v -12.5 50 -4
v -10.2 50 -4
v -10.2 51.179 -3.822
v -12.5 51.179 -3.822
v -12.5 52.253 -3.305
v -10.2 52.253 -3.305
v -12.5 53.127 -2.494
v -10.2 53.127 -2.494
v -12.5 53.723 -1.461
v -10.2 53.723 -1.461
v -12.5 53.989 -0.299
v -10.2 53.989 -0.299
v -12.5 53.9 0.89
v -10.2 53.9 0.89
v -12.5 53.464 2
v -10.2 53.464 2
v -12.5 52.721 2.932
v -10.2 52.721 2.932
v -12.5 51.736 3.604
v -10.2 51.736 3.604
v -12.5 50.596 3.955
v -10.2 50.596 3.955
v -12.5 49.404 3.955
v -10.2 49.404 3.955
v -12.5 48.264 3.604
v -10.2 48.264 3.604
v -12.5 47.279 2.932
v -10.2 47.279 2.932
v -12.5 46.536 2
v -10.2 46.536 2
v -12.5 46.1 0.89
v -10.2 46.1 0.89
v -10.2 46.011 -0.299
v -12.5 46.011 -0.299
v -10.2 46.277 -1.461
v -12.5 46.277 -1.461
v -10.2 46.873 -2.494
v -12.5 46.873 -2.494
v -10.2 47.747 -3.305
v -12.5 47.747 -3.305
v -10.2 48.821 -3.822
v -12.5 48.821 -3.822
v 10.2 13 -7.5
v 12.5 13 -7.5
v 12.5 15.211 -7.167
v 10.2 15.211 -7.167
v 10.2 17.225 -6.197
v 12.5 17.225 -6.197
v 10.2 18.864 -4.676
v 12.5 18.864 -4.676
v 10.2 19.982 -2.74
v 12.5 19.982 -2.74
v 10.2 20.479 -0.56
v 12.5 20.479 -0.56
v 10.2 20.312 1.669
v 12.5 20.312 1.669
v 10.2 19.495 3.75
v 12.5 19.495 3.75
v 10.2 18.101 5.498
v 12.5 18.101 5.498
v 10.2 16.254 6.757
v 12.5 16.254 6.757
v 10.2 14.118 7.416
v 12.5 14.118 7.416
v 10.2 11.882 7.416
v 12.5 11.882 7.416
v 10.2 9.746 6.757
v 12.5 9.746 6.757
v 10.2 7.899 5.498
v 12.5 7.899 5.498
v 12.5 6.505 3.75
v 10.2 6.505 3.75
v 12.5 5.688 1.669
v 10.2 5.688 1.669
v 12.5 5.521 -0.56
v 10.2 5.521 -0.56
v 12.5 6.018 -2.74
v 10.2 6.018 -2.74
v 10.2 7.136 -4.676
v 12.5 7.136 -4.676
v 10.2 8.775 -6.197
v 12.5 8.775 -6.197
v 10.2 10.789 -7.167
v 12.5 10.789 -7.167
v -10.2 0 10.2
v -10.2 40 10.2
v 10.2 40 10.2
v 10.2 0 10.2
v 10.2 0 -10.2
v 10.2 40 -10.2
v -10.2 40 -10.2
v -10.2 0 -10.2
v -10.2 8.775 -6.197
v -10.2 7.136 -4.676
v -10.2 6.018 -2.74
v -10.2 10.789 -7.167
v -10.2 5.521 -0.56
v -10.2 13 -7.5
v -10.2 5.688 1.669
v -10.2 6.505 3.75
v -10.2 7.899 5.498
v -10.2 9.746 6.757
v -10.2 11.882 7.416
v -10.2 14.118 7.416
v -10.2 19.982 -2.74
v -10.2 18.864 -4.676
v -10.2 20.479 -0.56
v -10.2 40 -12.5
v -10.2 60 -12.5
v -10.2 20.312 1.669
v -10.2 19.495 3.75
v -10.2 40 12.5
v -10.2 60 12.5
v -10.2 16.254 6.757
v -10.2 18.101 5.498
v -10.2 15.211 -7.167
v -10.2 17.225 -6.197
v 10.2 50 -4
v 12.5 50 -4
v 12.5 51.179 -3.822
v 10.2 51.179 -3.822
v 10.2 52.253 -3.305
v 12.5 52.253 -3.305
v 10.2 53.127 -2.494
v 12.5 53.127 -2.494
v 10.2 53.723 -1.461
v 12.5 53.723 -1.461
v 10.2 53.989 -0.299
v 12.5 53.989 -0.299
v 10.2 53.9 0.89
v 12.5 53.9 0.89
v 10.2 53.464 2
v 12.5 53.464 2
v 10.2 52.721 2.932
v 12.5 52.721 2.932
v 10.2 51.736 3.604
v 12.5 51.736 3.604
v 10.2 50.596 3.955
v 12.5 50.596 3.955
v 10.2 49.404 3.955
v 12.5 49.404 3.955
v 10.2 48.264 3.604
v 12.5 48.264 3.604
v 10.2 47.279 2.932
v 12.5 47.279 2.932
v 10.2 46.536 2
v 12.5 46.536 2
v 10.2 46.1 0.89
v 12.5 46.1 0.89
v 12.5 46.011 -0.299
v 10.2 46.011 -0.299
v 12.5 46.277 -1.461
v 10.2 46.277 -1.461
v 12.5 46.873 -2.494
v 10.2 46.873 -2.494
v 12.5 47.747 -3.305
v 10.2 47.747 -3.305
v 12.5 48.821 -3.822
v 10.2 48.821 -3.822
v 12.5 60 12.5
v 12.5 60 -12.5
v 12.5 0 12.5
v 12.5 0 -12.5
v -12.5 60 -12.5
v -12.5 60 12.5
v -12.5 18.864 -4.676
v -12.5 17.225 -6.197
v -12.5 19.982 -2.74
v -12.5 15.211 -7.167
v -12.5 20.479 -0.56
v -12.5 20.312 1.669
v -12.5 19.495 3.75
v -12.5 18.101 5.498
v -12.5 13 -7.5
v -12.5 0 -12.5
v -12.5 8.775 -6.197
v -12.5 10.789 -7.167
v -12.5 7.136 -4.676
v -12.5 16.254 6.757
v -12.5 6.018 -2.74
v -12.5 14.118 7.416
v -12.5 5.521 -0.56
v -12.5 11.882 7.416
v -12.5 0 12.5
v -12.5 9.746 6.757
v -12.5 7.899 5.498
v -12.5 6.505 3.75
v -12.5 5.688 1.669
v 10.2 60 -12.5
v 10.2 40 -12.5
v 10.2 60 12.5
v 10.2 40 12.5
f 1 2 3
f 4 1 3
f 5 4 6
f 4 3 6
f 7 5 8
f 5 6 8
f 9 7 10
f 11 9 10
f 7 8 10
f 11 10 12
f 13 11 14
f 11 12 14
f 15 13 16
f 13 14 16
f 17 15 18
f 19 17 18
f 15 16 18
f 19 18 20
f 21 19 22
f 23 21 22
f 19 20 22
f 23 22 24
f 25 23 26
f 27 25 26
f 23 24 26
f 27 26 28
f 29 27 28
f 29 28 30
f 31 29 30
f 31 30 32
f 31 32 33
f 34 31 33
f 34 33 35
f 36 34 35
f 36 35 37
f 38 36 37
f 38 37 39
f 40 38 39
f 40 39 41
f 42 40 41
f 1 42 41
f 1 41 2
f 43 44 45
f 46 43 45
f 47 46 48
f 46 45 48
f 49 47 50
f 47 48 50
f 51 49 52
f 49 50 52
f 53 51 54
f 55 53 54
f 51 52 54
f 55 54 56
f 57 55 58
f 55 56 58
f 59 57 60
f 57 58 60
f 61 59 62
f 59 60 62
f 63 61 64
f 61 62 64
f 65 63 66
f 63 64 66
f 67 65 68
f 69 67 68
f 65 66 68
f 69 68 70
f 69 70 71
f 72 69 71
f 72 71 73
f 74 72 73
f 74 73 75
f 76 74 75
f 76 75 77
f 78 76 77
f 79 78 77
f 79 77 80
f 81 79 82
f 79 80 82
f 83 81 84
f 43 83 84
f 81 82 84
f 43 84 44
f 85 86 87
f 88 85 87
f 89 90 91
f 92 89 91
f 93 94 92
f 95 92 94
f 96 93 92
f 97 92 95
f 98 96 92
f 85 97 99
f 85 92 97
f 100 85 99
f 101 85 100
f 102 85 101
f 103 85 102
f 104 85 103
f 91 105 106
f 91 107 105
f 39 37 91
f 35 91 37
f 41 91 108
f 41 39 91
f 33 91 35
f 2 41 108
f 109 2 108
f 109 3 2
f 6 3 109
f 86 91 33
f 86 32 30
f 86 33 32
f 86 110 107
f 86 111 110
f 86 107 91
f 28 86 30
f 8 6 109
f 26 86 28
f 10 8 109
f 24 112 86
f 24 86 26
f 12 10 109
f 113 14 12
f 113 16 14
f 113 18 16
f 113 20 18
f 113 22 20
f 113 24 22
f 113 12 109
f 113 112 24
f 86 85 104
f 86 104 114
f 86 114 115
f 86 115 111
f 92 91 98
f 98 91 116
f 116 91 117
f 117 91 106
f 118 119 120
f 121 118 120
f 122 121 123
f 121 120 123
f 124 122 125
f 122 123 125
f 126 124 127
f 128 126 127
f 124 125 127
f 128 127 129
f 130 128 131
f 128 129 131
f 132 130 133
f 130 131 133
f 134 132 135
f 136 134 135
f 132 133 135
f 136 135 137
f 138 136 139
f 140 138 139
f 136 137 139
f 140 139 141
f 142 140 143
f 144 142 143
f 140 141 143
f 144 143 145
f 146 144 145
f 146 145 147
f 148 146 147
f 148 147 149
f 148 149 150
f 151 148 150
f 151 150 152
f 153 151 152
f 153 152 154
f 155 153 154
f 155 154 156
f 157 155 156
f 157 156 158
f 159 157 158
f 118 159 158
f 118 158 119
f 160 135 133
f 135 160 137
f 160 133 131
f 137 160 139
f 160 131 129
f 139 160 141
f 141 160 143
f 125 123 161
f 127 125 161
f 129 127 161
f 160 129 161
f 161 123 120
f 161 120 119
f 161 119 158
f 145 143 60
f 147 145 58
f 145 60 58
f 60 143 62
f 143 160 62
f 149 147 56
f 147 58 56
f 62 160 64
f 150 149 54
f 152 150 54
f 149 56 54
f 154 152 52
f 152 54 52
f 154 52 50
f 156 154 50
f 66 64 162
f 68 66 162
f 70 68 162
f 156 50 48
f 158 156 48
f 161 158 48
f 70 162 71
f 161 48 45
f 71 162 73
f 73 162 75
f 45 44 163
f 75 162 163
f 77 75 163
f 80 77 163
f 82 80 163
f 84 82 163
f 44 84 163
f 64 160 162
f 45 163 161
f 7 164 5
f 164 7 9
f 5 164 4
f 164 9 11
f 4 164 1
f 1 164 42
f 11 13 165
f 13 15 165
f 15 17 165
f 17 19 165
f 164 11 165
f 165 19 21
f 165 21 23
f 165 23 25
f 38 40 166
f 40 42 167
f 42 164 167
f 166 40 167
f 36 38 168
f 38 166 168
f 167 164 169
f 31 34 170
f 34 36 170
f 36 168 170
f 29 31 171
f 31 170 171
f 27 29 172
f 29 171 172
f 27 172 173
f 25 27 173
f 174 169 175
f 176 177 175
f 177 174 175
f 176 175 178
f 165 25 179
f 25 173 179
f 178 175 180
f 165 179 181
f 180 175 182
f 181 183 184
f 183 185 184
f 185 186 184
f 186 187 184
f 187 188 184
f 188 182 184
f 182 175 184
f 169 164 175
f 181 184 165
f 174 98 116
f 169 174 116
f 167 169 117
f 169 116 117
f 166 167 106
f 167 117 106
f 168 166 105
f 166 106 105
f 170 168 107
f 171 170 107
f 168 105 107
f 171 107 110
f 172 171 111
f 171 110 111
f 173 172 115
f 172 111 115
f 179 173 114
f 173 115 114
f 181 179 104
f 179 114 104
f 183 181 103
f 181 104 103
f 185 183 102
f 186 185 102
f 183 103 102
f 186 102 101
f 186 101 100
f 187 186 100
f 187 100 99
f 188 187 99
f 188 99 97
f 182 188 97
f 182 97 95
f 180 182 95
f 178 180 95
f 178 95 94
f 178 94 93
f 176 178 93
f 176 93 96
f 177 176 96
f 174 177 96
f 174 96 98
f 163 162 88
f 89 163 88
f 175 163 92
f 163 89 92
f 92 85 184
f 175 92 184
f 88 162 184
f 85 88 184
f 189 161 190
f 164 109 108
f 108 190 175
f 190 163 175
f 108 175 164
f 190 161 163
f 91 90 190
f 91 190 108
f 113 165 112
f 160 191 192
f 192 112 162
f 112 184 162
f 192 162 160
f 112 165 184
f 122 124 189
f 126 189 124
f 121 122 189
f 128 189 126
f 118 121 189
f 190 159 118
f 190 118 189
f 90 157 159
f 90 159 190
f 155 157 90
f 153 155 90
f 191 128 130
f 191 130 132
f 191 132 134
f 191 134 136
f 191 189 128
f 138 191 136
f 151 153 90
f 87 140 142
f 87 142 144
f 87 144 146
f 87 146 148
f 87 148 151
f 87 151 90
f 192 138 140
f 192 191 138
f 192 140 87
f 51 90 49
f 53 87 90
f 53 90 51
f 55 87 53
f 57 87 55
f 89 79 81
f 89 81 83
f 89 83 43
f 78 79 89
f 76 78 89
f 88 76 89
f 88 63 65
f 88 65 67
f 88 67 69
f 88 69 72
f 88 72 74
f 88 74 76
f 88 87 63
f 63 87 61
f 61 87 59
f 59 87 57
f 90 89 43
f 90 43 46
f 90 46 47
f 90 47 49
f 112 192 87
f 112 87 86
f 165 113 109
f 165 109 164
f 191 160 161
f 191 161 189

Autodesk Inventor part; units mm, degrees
ref_plane "YZ Plane" through (0, 0, 0) normal (1, 0, 0) x (0, 1, 0)
ref_plane "XZ Plane" through (0, 0, 0) normal (0, 1, 0) x (-1, 0, 0)
ref_plane "XY Plane" through (0, 0, 0) normal (0, 0, 1) x (1, 0, 0)
sketch "スケッチ1" plane through (0, 0, 0) normal (0, 1, 0) x (-1, 0, 0)
  line L0 (12.5, 12.5) -> (-12.5, 12.5)
  line L1 (-12.5, 12.5) -> (-12.5, -12.5)
  line L2 (-12.5, -12.5) -> (12.5, -12.5)
  line L3 (12.5, -12.5) -> (12.5, 12.5)
  line L4 (12.5, 12.5) -> (-12.5, -12.5) construction
  line L5 (-12.5, 12.5) -> (12.5, -12.5) construction
  point P0 (0, 0)
  dimension "d0" = 25
  dimension "d1" = 25
extrude "押し出し1" add sketch "スケッチ1" along normal blind 60
shell "シェル1" thickness 2.3 removed faces 2 at (4.1667, 0, -4.1667) at (4.1667, 60, -4.1667)
sketch "スケッチ2" plane through (12.5, 0, 12.5) normal (1, 0, 0) x (0, 0, -1)
  circle A0 centre (12.5, 13) radius 7.5
  line L0 (0, 0) -> (25, 0) projected
  point P0 (12.5, 0)
  dimension "d5" = 13
  dimension "d6" = 15
extrude "押し出し2" cut sketch "スケッチ2" against normal through all
sketch "スケッチ3" plane through (-12.5, 0, 12.5) normal (0, 0, 1) x (1, 0, 0)
  line L0 (0, 60) -> (25, 60) projected
  line L1 (2.3, 60) -> (22.7, 60)
  line L2 (22.7, 60) -> (22.7, 40)
  line L3 (22.7, 40) -> (2.3, 40)
  line L4 (2.3, 40) -> (2.3, 60)
  line L5 (0, 0) -> (0, 60) projected
  line L6 (25, 0) -> (25, 60) projected
  point P0 (12.5, 0)
  dimension "d9" = 2.3
  dimension "d10" = 2.3
  dimension "d11" = 20
extrude "押し出し3" cut sketch "スケッチ3" against normal through all
sketch "スケッチ4" plane through (12.5, 0, 12.5) normal (1, 0, 0) x (0, 0, -1)
  circle A0 centre (12.5, 50) radius 4
  line L0 (0, 60) -> (25, 60) projected
  point P0 (12.5, 0)
  dimension "d14" = 8
  dimension "d15" = 10
extrude "押し出し4" cut sketch "スケッチ4" against normal through all
equation "\"d1\" = d0"
equation "\"d10\" = d9"
properties part number "pipe_square_back" material "鉄、可鍛鉄"
